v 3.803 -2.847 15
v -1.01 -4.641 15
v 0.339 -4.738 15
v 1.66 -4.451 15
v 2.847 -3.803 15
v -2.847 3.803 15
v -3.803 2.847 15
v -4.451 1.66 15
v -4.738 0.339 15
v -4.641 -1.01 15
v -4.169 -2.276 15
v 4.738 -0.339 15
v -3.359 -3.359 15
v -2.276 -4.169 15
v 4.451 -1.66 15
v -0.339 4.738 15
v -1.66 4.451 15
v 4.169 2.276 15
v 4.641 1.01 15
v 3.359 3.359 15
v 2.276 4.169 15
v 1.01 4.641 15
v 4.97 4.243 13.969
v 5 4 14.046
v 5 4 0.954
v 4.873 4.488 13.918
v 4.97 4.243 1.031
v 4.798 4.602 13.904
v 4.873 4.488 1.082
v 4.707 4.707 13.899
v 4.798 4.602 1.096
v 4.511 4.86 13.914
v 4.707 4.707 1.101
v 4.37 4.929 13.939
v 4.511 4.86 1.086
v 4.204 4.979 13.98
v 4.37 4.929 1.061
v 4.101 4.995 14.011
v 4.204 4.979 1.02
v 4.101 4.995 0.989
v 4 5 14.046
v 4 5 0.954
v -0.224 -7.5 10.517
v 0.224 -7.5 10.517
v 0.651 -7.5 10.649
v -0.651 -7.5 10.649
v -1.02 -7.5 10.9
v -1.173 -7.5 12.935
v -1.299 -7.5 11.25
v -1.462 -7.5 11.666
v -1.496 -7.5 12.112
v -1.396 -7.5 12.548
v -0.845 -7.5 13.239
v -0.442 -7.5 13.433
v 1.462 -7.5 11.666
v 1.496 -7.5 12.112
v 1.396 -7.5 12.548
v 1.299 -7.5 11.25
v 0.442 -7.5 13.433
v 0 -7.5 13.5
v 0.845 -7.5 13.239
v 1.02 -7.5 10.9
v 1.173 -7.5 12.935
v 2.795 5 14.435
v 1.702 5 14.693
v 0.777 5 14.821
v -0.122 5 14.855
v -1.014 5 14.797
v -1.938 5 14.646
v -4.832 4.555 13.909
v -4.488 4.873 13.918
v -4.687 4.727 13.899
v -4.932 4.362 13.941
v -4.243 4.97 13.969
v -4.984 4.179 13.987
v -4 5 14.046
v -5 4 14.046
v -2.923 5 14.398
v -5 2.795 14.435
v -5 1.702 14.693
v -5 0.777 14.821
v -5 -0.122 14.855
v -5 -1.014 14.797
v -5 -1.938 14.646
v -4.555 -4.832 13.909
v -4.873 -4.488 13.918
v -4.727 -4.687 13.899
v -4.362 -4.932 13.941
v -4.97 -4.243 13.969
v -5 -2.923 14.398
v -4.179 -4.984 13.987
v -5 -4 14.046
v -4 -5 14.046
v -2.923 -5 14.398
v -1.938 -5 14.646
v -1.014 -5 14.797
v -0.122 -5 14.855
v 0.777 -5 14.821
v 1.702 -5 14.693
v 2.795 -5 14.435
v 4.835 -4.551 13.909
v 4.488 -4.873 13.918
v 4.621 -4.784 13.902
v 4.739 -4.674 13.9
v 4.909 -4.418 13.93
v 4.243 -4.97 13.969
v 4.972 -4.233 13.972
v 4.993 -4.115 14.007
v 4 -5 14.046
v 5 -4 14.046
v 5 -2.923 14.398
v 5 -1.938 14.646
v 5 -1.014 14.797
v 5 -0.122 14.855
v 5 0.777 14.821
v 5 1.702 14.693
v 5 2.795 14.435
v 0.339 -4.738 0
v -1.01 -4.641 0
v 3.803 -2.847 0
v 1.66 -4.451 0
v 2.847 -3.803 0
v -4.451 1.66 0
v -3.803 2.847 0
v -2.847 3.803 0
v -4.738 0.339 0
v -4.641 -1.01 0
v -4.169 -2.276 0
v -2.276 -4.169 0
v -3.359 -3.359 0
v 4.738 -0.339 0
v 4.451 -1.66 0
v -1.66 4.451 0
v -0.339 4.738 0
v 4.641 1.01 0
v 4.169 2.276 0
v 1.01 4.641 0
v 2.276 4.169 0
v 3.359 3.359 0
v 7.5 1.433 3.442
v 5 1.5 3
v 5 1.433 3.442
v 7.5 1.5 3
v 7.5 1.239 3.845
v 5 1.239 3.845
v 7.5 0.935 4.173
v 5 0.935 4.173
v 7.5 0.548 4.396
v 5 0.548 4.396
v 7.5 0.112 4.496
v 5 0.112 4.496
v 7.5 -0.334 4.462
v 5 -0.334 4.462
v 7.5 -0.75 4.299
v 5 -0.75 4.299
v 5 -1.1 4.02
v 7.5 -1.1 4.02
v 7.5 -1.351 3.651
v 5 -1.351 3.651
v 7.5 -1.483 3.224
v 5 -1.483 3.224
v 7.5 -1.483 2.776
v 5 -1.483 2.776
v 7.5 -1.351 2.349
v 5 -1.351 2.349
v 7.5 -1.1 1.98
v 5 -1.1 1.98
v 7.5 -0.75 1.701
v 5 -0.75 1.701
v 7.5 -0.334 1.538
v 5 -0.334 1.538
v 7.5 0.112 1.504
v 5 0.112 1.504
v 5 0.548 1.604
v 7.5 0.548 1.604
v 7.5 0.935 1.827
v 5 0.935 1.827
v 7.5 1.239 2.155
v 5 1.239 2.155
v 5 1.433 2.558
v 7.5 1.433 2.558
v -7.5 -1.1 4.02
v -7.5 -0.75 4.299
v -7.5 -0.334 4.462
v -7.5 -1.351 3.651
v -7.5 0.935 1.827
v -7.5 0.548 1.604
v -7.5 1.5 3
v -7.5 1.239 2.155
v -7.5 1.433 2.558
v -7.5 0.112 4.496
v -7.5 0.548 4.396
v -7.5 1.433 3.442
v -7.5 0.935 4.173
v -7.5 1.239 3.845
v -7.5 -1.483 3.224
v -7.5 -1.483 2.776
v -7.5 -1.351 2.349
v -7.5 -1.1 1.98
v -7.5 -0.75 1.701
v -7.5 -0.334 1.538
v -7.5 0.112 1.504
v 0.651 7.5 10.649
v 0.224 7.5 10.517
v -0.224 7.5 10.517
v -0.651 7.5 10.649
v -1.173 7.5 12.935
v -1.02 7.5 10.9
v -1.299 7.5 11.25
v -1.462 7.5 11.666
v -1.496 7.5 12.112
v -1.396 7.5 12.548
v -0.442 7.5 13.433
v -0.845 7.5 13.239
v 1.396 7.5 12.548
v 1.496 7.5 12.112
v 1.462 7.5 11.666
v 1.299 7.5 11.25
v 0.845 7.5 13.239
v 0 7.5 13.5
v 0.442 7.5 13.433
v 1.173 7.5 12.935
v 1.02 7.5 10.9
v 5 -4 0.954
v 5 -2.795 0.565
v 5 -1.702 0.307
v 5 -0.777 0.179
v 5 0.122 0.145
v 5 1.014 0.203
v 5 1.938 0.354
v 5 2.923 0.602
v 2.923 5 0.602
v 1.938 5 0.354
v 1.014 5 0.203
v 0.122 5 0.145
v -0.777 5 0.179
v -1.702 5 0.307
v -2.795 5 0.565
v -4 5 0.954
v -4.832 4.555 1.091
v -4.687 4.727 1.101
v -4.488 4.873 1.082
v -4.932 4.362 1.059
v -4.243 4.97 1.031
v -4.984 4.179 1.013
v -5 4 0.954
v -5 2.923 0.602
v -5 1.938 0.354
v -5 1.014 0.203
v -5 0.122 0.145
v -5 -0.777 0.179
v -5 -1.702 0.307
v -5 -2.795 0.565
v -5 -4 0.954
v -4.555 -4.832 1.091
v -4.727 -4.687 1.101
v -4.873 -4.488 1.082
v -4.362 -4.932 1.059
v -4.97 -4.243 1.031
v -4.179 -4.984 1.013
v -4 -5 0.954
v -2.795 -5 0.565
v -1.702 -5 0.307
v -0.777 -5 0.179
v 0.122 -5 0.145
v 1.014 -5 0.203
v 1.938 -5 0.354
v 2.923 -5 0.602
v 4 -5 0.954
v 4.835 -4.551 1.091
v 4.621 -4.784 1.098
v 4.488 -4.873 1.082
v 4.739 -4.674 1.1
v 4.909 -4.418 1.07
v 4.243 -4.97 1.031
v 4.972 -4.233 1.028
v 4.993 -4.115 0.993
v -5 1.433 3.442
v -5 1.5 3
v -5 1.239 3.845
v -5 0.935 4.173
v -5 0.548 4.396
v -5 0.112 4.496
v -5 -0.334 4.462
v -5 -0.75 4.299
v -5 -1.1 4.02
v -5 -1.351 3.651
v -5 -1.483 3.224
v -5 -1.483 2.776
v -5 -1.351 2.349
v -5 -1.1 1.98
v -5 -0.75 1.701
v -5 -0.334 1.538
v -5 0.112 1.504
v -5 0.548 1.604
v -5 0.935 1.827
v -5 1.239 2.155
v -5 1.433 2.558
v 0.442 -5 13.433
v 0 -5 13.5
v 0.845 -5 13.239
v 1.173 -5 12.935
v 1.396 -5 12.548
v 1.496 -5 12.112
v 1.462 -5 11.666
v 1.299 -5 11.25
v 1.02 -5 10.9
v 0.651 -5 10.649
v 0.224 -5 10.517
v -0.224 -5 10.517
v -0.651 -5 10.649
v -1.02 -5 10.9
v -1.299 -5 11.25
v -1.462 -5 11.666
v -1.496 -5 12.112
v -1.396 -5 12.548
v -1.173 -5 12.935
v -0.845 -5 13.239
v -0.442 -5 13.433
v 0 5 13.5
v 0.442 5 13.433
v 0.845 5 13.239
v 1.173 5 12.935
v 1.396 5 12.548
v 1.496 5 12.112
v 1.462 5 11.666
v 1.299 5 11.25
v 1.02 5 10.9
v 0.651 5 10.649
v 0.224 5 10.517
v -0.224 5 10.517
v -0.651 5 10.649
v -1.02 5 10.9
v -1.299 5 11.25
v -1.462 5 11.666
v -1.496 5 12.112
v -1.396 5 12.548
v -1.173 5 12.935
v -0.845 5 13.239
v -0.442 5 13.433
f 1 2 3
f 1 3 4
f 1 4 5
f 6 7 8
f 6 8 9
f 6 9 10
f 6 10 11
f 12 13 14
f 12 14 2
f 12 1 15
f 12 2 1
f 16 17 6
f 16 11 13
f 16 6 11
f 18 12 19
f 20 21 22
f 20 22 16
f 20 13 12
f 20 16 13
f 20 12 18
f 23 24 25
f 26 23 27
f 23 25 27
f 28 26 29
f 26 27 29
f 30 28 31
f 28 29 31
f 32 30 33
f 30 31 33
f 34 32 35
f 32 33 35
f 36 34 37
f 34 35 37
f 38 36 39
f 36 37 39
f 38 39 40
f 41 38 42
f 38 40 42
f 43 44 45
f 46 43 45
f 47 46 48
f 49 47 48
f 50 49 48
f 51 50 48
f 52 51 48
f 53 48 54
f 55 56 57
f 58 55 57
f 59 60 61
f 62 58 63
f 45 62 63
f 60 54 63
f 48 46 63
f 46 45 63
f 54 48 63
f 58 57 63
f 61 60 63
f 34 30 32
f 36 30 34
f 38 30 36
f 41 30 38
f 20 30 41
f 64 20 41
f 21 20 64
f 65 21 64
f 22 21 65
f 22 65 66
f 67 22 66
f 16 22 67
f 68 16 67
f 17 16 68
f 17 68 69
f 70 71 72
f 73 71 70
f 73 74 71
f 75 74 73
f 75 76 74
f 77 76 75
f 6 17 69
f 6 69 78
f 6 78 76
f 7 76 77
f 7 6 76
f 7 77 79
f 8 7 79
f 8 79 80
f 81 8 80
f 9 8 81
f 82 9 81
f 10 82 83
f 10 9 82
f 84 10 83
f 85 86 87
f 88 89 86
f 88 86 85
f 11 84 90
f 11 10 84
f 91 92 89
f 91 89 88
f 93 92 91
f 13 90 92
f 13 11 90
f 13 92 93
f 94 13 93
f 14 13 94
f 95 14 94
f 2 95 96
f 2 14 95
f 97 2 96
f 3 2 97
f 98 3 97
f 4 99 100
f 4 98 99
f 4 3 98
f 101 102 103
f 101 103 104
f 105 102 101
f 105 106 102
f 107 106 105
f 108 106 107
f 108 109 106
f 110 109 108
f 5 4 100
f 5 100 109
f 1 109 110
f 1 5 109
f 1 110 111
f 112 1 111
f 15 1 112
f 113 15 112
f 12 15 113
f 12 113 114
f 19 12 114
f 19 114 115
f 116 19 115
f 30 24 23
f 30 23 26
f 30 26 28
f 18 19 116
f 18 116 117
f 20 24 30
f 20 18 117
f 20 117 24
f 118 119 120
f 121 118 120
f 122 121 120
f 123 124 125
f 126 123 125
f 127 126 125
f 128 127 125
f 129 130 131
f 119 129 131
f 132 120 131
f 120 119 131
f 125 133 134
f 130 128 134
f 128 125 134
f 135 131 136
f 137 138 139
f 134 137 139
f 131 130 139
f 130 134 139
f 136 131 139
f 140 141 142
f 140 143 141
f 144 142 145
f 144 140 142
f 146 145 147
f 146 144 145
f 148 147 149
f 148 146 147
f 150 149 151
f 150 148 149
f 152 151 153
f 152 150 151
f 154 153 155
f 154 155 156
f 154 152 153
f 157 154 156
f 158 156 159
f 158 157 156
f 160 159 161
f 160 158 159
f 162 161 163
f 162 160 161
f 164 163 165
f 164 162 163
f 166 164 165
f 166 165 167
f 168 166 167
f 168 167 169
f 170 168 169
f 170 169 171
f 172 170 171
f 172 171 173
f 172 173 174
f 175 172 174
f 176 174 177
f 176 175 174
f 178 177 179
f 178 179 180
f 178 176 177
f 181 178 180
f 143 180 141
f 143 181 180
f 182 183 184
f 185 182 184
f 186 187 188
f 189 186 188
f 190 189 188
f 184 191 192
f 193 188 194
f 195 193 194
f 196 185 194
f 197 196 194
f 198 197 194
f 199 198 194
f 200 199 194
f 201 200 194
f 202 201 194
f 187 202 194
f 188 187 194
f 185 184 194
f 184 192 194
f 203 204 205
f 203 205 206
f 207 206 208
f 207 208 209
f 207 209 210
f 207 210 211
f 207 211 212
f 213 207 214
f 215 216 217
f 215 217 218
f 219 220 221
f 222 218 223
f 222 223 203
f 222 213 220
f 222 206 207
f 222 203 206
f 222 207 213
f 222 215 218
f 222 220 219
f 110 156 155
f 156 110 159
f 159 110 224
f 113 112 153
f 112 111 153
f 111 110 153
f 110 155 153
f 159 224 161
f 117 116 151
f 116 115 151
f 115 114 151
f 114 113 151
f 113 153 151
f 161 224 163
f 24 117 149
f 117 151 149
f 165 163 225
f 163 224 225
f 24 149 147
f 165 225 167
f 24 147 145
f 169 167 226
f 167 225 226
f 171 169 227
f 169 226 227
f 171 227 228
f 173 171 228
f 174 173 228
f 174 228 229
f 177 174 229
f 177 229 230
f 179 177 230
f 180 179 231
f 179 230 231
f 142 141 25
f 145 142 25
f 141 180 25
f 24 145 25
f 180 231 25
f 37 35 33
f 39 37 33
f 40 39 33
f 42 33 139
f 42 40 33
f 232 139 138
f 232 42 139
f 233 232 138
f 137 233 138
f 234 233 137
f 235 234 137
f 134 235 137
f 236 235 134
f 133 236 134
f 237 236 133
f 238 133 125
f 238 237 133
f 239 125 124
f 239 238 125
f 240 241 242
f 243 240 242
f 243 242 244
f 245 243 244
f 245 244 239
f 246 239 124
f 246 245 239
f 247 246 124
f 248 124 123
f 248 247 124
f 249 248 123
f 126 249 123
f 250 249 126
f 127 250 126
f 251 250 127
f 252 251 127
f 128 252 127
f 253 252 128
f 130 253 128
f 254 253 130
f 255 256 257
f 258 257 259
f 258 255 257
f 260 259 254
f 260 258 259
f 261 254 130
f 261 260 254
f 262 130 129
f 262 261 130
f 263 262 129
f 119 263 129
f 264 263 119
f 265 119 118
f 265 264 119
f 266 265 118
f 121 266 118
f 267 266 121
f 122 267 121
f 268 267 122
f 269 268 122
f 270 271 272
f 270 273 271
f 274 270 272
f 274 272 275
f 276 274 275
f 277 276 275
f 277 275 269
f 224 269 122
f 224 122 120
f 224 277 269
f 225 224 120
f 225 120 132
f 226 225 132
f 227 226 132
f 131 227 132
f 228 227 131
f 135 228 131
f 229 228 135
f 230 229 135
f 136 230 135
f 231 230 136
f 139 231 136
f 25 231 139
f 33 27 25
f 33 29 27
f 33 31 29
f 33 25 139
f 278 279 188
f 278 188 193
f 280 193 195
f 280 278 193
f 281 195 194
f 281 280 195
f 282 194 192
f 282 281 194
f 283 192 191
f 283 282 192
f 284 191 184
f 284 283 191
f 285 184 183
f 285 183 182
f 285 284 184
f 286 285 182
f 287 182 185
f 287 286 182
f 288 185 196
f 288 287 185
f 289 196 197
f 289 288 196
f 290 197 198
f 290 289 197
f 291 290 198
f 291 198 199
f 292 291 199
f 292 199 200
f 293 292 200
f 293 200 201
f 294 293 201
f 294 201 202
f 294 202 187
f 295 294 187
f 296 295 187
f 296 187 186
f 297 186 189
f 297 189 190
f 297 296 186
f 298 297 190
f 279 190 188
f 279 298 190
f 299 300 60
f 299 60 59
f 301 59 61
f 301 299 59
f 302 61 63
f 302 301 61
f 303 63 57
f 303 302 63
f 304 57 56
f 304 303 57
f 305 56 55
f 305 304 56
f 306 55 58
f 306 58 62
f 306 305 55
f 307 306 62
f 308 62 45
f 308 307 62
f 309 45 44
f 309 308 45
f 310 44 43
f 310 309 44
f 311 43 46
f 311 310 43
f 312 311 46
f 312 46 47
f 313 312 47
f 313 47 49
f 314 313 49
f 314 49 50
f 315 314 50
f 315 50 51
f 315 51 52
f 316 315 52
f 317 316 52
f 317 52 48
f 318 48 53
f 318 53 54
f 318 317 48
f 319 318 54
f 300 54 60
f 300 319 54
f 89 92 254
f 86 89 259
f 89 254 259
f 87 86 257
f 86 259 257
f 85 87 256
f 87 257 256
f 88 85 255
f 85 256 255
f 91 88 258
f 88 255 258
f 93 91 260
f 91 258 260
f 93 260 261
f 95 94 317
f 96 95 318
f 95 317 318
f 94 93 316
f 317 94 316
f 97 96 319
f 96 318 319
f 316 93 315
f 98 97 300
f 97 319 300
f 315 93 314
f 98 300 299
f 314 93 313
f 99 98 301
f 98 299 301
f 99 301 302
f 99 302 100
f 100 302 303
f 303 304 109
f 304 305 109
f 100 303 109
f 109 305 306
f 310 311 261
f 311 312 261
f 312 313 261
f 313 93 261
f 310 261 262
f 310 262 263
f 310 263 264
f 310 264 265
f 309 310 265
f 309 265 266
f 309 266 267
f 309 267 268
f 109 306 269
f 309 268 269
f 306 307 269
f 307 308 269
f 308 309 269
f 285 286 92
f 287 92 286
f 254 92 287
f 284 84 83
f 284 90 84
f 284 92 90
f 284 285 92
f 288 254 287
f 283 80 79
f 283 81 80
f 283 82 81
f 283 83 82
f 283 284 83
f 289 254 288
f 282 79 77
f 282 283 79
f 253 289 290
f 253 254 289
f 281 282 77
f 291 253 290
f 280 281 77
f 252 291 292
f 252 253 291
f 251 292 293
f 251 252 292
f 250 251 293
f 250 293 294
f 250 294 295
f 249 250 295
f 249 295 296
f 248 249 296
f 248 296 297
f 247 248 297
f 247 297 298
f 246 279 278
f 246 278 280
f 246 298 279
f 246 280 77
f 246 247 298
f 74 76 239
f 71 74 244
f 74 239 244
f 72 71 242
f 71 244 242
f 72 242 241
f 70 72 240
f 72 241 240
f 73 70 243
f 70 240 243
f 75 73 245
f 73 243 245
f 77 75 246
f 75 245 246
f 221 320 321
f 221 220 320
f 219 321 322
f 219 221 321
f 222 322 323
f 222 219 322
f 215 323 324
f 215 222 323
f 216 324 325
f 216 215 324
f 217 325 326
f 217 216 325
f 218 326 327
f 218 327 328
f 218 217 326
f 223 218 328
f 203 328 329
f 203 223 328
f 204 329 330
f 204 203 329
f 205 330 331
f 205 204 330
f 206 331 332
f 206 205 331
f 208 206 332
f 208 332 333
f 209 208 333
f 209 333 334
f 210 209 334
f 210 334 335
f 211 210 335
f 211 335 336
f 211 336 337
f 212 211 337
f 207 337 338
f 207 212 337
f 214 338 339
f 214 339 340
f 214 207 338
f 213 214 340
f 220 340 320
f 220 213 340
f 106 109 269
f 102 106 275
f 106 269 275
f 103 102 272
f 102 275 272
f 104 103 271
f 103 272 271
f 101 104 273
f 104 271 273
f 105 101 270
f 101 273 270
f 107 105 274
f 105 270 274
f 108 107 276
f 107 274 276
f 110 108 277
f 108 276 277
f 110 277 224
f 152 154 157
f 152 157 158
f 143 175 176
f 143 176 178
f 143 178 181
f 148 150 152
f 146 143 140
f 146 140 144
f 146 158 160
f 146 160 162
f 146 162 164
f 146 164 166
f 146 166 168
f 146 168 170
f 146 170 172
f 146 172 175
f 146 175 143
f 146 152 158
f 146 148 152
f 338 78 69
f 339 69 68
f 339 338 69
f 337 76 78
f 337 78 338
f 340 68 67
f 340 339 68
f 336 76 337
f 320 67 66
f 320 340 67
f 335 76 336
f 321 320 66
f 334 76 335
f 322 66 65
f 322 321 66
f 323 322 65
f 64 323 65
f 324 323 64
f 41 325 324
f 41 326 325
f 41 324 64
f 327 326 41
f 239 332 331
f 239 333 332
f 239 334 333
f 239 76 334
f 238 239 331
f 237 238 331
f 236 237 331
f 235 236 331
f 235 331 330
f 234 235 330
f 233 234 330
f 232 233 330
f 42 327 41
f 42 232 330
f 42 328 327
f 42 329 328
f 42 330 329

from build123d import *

# Parameters (mm, degrees)
CROQUIS1_W              = 10
CROQUIS1_H              = 10
SALIENTE_EXTRUIR1_DEPTH = 15
REDONDEO1_R             = 1
CROQUIS4_R              = 1.5
SALIENTE_EXTRUIR2_DEPTH = 7.5
CROQUIS5_R              = 1.5
SALIENTE_EXTRUIR3_DEPTH = 7.5


with BuildPart() as part:
    # Croquis1 → Saliente-Extruir1 (new body)
    with BuildSketch(Plane.XY):
        Rectangle(CROQUIS1_W, CROQUIS1_H)
    extrude(amount=SALIENTE_EXTRUIR1_DEPTH)

    # Croquis3 → Cortar-Revolución1 (revolve, cut)
    with BuildSketch(Plane(origin=(0, 0, 0), x_dir=(0, 0, -1), z_dir=(1, 0, 0))):
        Polygon((-15, 4.75), (-15, 15.04), (0, 15.04), (0, 4.75), (-4.474464586, 12.5), (-10.525535414, 12.5), align=None)
    revolve(axis=Axis((0, 0, -0.75), (0, 0, 1)), mode=Mode.SUBTRACT)

    # Redondeo1
    redondeo1_edges = [part.edges().sort_by_distance(p)[0] for p in [
        (-5, 5, 7.5),
        (-5, -5, 7.5),
        (5, -5, 7.5),
        (5, 5, 7.5),
    ]]
    fillet(redondeo1_edges, radius=REDONDEO1_R)

    # Croquis4 → Saliente-Extruir2 (add, symmetric)
    with BuildSketch(Plane(origin=(0, 0, 0), x_dir=(0, 0, -1), z_dir=(1, 0, 0))):
        with Locations((-3, 0)):
            Circle(CROQUIS4_R)
    extrude(amount=SALIENTE_EXTRUIR2_DEPTH, both=True)

    # Croquis5 → Saliente-Extruir3 (add, symmetric)
    with BuildSketch(Plane(origin=(0, 0, 0), x_dir=(1, 0, 0), z_dir=(0, 1, 0))):
        with Locations((0, -12)):
            Circle(CROQUIS5_R)
    extrude(amount=SALIENTE_EXTRUIR3_DEPTH, both=True)


solid = part.part
